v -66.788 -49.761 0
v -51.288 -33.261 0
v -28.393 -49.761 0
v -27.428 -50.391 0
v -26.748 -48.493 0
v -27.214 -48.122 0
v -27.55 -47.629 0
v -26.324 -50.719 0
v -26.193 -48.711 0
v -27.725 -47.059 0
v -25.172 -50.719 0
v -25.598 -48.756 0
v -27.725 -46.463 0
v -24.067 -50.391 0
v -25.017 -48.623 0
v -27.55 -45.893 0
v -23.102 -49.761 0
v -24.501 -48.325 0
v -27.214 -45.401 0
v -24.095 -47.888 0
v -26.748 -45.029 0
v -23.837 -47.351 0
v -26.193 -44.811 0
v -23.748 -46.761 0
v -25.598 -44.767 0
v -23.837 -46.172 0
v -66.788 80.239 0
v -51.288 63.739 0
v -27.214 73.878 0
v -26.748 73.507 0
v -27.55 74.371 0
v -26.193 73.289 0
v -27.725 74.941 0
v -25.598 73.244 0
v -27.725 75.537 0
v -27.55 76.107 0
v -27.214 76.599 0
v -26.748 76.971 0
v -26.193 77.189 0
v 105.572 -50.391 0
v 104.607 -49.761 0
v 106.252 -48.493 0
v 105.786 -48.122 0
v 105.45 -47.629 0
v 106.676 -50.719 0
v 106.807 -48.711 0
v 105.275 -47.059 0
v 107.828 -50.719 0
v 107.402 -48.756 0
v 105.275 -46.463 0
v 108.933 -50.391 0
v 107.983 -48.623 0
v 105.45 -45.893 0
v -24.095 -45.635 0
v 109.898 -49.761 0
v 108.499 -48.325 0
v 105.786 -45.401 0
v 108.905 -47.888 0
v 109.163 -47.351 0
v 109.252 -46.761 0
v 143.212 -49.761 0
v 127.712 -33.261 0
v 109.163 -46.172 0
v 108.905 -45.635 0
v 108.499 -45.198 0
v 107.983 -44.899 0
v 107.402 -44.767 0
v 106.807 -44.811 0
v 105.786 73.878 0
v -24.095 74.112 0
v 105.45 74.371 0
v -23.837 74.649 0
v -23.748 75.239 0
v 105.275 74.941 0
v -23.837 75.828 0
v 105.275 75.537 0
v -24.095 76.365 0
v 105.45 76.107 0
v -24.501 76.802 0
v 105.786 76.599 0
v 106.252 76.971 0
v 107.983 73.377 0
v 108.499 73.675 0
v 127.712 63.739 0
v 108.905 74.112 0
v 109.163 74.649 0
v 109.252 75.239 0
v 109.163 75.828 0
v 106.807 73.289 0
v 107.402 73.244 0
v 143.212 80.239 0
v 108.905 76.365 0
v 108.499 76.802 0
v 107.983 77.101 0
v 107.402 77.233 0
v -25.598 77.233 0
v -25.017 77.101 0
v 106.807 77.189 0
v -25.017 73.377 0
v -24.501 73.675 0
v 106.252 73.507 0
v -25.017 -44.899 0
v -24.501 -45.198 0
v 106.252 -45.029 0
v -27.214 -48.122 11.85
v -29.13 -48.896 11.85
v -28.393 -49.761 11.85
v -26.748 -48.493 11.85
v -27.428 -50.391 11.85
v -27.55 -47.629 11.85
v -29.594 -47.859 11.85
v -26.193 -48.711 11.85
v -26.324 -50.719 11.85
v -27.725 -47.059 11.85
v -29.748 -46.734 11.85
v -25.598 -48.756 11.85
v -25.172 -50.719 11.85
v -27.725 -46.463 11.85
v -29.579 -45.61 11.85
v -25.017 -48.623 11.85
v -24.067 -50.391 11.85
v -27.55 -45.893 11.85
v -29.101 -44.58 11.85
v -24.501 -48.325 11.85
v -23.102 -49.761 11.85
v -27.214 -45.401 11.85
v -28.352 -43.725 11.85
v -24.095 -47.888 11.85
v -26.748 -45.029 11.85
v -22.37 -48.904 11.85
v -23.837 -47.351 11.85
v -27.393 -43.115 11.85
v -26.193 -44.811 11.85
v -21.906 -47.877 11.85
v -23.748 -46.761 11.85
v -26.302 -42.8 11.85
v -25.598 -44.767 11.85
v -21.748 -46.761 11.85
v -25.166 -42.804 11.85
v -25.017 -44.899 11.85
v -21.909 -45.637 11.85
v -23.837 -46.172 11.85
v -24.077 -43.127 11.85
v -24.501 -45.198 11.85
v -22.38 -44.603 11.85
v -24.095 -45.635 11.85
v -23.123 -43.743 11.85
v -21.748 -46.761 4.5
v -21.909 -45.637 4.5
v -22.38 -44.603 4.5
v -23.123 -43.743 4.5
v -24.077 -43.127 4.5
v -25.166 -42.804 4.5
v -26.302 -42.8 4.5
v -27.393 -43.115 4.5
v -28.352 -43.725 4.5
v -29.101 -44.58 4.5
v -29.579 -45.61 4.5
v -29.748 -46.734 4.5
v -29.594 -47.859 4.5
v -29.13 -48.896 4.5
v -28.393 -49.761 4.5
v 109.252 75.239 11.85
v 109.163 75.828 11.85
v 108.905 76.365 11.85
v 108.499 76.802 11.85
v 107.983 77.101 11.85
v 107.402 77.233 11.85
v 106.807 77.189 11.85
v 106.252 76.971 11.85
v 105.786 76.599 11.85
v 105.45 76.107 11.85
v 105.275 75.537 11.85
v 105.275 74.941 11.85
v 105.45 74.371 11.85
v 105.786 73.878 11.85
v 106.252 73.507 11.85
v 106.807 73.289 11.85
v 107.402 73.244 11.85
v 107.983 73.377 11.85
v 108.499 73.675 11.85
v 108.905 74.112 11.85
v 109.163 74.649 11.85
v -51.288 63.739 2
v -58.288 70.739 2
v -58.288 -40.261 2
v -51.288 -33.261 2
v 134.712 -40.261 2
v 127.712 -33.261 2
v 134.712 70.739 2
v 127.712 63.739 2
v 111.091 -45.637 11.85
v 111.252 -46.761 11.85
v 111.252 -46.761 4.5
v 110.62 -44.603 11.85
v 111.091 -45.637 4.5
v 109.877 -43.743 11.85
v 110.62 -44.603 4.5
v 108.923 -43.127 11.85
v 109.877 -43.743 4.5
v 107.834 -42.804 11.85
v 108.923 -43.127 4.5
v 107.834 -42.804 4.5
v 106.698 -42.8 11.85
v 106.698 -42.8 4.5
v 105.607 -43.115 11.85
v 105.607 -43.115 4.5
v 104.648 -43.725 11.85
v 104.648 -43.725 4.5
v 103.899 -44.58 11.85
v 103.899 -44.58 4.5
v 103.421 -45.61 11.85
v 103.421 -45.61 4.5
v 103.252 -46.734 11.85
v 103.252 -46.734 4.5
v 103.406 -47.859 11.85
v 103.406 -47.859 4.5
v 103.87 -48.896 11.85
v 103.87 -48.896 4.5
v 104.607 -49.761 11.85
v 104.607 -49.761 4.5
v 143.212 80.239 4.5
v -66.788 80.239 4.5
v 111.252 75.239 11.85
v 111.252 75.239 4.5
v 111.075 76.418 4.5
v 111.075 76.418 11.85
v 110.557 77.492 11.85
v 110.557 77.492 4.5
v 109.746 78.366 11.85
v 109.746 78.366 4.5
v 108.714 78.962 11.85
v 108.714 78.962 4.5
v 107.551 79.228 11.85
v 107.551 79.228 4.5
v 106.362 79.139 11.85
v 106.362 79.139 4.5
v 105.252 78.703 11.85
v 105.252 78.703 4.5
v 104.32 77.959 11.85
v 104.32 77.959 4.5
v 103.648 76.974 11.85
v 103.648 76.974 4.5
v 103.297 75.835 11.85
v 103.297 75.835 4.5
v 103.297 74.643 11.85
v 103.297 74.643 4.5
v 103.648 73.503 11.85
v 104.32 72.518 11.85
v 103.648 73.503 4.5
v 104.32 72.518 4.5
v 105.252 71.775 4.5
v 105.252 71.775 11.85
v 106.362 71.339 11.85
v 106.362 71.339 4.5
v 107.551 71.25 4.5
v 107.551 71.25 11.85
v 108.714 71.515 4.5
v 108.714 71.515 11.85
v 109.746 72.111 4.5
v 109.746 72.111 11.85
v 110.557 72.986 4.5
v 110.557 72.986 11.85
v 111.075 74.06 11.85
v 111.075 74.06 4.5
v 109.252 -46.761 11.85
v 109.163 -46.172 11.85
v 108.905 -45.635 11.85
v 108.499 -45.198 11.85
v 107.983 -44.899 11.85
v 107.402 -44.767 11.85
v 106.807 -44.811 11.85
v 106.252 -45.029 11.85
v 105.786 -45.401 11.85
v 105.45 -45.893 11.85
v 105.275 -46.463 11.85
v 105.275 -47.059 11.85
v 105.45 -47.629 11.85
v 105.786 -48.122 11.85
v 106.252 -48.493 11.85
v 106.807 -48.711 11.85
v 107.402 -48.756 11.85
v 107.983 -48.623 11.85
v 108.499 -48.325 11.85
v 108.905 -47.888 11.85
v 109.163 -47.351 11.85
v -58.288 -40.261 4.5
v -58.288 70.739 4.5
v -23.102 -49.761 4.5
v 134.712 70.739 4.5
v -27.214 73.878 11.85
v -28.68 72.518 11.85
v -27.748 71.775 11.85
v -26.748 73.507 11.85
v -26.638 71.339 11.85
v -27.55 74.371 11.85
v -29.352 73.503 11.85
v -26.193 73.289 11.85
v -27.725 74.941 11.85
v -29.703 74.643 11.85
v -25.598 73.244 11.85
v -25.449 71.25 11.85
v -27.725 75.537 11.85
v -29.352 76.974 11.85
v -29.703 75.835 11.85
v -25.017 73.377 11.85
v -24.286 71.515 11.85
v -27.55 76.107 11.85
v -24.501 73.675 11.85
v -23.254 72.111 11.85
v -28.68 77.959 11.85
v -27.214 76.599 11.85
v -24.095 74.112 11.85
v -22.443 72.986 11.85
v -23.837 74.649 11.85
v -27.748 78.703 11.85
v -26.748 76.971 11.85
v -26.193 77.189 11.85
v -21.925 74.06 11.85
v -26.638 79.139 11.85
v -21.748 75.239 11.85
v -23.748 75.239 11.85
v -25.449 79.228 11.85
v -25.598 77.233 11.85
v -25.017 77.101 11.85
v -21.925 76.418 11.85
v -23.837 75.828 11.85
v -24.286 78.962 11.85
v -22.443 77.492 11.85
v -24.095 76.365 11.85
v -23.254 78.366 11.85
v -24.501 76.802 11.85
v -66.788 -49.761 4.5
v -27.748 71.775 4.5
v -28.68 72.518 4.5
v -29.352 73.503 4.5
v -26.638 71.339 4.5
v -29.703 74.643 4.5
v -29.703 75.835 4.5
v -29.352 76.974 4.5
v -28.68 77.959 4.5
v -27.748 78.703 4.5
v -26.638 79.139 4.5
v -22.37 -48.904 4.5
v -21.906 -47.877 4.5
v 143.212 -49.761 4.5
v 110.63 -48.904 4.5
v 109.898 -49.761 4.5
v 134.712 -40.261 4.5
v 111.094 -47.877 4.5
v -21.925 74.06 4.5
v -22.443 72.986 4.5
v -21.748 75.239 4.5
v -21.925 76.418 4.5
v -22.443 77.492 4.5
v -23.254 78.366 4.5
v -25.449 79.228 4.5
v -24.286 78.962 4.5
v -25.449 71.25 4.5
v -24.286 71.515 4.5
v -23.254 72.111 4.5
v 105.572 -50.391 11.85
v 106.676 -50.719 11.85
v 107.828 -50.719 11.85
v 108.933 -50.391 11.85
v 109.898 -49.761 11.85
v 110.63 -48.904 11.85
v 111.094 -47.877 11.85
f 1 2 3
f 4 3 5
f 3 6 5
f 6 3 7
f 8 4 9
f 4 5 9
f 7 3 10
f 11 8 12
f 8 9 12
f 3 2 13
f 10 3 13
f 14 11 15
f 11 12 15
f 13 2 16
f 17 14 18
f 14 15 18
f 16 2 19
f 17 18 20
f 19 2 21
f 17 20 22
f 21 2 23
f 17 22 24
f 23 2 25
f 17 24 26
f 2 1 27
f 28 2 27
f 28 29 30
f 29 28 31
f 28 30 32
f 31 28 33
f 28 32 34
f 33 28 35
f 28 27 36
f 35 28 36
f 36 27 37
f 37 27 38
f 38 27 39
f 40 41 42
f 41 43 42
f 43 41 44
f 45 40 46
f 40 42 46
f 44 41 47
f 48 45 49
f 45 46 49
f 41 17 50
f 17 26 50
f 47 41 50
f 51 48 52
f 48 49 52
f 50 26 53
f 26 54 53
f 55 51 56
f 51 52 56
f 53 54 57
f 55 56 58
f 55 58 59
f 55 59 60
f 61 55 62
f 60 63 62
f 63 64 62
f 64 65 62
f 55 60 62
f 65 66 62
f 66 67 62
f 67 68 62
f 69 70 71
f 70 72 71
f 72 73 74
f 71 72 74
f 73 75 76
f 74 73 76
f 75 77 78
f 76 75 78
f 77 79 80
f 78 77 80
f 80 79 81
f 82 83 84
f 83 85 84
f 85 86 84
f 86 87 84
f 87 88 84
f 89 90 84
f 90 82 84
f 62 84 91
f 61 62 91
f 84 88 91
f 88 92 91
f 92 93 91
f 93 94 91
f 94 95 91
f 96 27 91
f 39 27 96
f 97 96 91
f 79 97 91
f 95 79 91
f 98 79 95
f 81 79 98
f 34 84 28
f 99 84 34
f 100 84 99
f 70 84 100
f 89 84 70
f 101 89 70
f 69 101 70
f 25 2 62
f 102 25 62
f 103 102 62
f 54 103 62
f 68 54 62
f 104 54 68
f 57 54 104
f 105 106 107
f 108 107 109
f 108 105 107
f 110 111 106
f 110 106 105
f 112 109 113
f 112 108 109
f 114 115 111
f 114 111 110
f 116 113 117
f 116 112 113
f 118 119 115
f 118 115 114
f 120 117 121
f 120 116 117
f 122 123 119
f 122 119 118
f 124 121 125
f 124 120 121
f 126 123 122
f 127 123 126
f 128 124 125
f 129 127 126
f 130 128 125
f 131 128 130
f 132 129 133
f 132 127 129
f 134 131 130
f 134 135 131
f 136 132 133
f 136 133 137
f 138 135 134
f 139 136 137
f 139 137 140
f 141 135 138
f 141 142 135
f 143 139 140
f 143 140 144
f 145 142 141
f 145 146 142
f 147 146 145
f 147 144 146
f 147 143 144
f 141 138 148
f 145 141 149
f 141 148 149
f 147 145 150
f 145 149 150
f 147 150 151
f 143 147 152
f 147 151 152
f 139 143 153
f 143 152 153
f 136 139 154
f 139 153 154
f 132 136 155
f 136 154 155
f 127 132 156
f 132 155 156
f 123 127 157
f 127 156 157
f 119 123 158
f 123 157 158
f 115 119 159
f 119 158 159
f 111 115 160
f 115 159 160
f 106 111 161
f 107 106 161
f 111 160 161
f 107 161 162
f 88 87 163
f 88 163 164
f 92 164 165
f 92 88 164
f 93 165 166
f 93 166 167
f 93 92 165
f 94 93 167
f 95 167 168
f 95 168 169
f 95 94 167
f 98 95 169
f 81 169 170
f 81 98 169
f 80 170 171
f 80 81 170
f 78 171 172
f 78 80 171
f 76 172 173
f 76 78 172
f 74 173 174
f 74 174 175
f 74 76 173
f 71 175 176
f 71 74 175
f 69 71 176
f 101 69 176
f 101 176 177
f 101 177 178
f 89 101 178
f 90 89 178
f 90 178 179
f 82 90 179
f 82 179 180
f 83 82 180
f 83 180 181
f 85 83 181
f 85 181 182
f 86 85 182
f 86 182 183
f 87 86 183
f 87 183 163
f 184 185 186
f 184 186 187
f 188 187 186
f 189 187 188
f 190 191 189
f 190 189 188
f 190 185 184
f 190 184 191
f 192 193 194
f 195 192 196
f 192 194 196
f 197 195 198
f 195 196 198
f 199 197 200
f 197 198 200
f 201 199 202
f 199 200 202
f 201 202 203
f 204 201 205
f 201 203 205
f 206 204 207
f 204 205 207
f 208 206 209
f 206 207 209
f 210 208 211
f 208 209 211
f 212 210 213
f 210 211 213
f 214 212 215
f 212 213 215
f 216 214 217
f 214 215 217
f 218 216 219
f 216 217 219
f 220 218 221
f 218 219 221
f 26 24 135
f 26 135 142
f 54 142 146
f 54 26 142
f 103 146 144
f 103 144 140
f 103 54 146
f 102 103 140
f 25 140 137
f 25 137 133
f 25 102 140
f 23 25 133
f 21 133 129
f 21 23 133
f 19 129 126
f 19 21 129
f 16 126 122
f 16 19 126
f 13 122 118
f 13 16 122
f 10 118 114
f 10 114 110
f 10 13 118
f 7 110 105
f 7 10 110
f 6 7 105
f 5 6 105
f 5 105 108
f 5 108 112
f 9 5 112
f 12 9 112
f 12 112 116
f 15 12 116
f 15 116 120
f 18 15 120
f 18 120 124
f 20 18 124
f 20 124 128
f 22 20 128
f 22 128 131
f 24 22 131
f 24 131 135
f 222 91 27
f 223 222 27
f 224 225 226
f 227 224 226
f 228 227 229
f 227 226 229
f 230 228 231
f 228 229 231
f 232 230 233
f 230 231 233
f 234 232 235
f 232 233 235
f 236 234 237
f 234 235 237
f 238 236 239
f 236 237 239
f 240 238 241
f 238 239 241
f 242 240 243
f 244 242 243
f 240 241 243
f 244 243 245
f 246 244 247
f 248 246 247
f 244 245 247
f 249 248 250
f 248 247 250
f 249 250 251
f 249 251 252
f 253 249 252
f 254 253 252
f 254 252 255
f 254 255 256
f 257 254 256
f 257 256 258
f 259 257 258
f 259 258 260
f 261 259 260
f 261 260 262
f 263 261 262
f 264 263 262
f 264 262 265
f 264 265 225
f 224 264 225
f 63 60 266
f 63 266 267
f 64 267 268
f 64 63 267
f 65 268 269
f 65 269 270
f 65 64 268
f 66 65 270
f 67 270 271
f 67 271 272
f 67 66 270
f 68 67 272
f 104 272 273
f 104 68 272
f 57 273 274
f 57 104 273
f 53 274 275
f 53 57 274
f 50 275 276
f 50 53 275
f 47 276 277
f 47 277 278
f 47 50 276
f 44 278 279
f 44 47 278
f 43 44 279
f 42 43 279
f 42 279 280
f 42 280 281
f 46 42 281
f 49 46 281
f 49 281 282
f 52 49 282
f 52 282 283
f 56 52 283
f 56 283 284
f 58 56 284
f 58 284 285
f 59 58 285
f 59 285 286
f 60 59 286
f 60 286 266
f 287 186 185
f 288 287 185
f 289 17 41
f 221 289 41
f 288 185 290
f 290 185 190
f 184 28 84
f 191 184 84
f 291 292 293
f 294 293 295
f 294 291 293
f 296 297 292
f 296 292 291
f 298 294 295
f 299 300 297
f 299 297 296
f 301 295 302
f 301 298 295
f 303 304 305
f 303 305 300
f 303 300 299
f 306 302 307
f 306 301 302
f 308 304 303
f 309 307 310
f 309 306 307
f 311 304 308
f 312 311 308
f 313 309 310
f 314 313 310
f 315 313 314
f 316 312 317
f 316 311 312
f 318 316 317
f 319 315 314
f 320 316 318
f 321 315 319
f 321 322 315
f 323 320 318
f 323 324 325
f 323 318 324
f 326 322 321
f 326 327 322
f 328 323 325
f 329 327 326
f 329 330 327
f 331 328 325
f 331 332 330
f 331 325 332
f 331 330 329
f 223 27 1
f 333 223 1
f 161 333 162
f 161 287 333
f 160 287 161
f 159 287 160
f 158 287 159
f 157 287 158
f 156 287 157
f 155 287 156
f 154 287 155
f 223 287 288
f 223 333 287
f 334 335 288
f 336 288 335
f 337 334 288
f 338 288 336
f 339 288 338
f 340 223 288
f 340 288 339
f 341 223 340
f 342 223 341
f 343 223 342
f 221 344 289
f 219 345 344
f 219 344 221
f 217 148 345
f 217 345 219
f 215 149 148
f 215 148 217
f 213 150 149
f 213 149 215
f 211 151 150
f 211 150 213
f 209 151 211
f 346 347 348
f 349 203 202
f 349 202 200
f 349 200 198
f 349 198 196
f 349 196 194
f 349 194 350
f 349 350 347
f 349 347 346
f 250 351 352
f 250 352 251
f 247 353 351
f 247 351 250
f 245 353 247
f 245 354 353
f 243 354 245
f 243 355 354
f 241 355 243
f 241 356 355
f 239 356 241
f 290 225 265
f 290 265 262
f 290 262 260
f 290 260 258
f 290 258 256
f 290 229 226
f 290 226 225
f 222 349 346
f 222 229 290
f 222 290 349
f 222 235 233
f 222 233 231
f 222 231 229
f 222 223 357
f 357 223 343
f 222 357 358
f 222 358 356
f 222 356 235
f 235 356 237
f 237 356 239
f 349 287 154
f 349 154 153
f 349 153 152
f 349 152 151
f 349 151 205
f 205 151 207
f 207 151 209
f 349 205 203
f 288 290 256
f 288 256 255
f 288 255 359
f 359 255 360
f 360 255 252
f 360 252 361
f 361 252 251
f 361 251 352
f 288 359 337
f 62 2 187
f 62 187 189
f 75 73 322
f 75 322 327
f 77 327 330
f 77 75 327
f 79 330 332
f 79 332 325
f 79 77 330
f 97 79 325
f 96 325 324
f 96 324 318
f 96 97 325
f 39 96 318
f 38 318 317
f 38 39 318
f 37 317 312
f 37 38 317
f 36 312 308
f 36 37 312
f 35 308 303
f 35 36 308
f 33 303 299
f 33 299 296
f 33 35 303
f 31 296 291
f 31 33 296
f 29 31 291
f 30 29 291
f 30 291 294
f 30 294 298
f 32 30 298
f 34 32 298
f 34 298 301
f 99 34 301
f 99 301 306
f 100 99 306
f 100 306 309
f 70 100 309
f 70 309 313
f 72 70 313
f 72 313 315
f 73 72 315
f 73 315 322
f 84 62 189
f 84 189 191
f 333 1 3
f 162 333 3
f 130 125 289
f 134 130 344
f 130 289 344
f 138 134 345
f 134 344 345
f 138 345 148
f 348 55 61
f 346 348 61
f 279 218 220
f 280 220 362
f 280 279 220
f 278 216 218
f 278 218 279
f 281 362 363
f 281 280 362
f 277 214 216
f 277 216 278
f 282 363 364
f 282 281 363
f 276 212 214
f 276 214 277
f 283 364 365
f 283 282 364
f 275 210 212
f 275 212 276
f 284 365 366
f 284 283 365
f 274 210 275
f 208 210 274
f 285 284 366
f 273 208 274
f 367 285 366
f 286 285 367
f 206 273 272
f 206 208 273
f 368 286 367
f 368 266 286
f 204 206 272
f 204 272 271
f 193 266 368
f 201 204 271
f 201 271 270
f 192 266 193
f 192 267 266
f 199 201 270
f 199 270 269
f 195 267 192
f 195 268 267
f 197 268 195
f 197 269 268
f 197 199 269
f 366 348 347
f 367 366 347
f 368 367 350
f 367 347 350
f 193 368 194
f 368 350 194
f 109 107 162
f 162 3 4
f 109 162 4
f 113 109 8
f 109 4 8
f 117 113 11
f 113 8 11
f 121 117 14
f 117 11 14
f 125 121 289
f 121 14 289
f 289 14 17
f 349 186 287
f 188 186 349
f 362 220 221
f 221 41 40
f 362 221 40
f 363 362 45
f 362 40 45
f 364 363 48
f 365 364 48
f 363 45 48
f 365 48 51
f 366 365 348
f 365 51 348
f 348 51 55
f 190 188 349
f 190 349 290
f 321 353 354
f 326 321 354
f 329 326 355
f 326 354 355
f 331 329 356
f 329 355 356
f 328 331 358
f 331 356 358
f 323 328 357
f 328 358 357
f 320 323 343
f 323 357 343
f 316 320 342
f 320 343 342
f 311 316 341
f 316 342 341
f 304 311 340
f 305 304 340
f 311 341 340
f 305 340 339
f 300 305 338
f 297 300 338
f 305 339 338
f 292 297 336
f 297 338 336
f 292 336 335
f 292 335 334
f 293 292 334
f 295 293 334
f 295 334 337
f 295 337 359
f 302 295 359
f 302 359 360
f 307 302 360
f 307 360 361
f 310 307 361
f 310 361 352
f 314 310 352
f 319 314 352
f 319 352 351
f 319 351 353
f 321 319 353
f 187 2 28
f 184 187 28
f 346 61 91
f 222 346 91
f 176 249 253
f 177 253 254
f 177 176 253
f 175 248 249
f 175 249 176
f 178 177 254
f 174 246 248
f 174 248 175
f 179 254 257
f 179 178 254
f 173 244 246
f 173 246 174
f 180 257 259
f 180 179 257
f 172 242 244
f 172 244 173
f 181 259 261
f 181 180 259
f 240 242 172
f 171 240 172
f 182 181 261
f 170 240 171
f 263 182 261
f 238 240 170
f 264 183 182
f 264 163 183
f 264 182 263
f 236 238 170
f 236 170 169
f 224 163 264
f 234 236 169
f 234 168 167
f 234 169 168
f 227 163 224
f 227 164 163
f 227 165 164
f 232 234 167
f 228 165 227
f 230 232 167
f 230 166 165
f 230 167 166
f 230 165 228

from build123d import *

# Parameters (mm, degrees)
F0_W     = 193
F0_H     = 111
F0_W_2   = 179
F0_H_2   = 97
F1_DEPTH = 2
F0_R     = 4
F0_R_2   = 2
F2_DEPTH = 4.5
F3_DEPTH = 5
F4_DEPTH = 11.85


with BuildPart() as f1:
    # F0 (on Top) → F1 (new body)
    with BuildSketch(Plane.XY):
        with Locations((38.2122632861, 15.2387920618)):
            Rectangle(F0_W, F0_H)
        with Locations((38.2122632861, 15.2387920618)):
            Rectangle(F0_W_2, F0_H_2, mode=Mode.SUBTRACT)
    extrude(amount=F1_DEPTH)

    # F0 (on Top) → F2 (join)
    with BuildSketch(Plane.XY):
        with BuildLine():
            Line((143.2122632861, 80.2387920618), (-66.7877367139, 80.2387920618))
            Line((-66.7877367139, 80.2387920618), (-66.7877367139, -49.7612079382))
            Line((-66.7877367139, -49.7612079382), (-28.393488025, -49.7612079382))
            ThreePointArc((-28.393488025, -49.7612079382), (-27.393488025, -43.1154566271), (-21.7477367139, -46.7612079382))
            ThreePointArc((-21.7477367139, -46.7612079382), (-22.1019854028, -48.4069592493), (-23.1019854028, -49.7612079382))
            Line((-23.1019854028, -49.7612079382), (104.606511975, -49.7612079382))
            ThreePointArc((104.606511975, -49.7612079382), (105.606511975, -43.1154566271), (111.2522632861, -46.7612079382))
            ThreePointArc((111.2522632861, -46.7612079382), (110.8980145972, -48.4069592493), (109.8980145972, -49.7612079382))
            Line((109.8980145972, -49.7612079382), (143.2122632861, -49.7612079382))
            Line((143.2122632861, -49.7612079382), (143.2122632861, 80.2387920618))
        make_face()
        with Locations((38.2122632861, 15.2387920618)):
            Rectangle(F0_W, F0_H, mode=Mode.SUBTRACT)
        with Locations((-25.7477367139, 75.2387920618)):
            Circle(F0_R, mode=Mode.SUBTRACT)
        with Locations((107.2522632861, 75.2387920618)):
            Circle(F0_R, mode=Mode.SUBTRACT)
        with Locations((-25.7477367139, 75.2387920618)):
            Circle(F0_R)
        with Locations((-25.7477367139, 75.2387920618)):
            Circle(F0_R_2, mode=Mode.SUBTRACT)
        with Locations((107.2522632861, 75.2387920618)):
            Circle(F0_R)
        with Locations((107.2522632861, 75.2387920618)):
            Circle(F0_R_2, mode=Mode.SUBTRACT)
        with BuildLine():
            ThreePointArc((-21.7477367139, -46.7612079382), (-27.393488025, -43.1154566271), (-28.393488025, -49.7612079382))
            Line((-28.393488025, -49.7612079382), (-23.1019854028, -49.7612079382))
            ThreePointArc((-23.1019854028, -49.7612079382), (-22.1019854028, -48.4069592493), (-21.7477367139, -46.7612079382))
        make_face()
        with Locations((-25.7477367139, -46.7612079382)):
            Circle(F0_R_2, mode=Mode.SUBTRACT)
        with BuildLine():
            Line((104.606511975, -49.7612079382), (109.8980145972, -49.7612079382))
            ThreePointArc((109.8980145972, -49.7612079382), (110.8980145972, -48.4069592493), (111.2522632861, -46.7612079382))
            ThreePointArc((111.2522632861, -46.7612079382), (105.606511975, -43.1154566271), (104.606511975, -49.7612079382))
        make_face()
        with Locations((107.2522632861, -46.7612079382)):
            Circle(F0_R_2, mode=Mode.SUBTRACT)
    extrude(amount=F2_DEPTH)

    # F0 (on Top) → F3 (cut)
    with BuildSketch(Plane.XY):
        with Locations((-25.7477367139, 75.2387920618)):
            Circle(F0_R_2)
        with Locations((107.2522632861, 75.2387920618)):
            Circle(F0_R_2)
        with Locations((107.2522632861, -46.7612079382)):
            Circle(F0_R_2)
        with Locations((-25.7477367139, -46.7612079382)):
            Circle(F0_R_2)
    extrude(amount=-F3_DEPTH, mode=Mode.SUBTRACT)

    # F0 (on Top) → F4 (join)
    with BuildSketch(Plane.XY):
        with Locations((-25.7477367139, 75.2387920618)):
            Circle(F0_R)
        with Locations((-25.7477367139, 75.2387920618)):
            Circle(F0_R_2, mode=Mode.SUBTRACT)
        with BuildLine():
            Line((104.606511975, -49.7612079382), (109.8980145972, -49.7612079382))
            ThreePointArc((109.8980145972, -49.7612079382), (110.8980145972, -48.4069592493), (111.2522632861, -46.7612079382))
            ThreePointArc((111.2522632861, -46.7612079382), (105.606511975, -43.1154566271), (104.606511975, -49.7612079382))
        make_face()
        with Locations((107.2522632861, -46.7612079382)):
            Circle(F0_R_2, mode=Mode.SUBTRACT)
        with BuildLine():
            ThreePointArc((104.606511975, -49.7612079382), (107.2522632861, -50.7612079382), (109.8980145972, -49.7612079382))
            Line((109.8980145972, -49.7612079382), (104.606511975, -49.7612079382))
        make_face()
        with BuildLine():
            ThreePointArc((-21.7477367139, -46.7612079382), (-27.393488025, -43.1154566271), (-28.393488025, -49.7612079382))
            Line((-28.393488025, -49.7612079382), (-23.1019854028, -49.7612079382))
            ThreePointArc((-23.1019854028, -49.7612079382), (-22.1019854028, -48.4069592493), (-21.7477367139, -46.7612079382))
        make_face()
        with Locations((-25.7477367139, -46.7612079382)):
            Circle(F0_R_2, mode=Mode.SUBTRACT)
        with BuildLine():
            Line((-23.1019854028, -49.7612079382), (-28.393488025, -49.7612079382))
            ThreePointArc((-28.393488025, -49.7612079382), (-25.7477367139, -50.7612079382), (-23.1019854028, -49.7612079382))
        make_face()
        with Locations((107.2522632861, 75.2387920618)):
            Circle(F0_R)
        with Locations((107.2522632861, 75.2387920618)):
            Circle(F0_R_2, mode=Mode.SUBTRACT)
    extrude(amount=F4_DEPTH)


solid = f1.part
